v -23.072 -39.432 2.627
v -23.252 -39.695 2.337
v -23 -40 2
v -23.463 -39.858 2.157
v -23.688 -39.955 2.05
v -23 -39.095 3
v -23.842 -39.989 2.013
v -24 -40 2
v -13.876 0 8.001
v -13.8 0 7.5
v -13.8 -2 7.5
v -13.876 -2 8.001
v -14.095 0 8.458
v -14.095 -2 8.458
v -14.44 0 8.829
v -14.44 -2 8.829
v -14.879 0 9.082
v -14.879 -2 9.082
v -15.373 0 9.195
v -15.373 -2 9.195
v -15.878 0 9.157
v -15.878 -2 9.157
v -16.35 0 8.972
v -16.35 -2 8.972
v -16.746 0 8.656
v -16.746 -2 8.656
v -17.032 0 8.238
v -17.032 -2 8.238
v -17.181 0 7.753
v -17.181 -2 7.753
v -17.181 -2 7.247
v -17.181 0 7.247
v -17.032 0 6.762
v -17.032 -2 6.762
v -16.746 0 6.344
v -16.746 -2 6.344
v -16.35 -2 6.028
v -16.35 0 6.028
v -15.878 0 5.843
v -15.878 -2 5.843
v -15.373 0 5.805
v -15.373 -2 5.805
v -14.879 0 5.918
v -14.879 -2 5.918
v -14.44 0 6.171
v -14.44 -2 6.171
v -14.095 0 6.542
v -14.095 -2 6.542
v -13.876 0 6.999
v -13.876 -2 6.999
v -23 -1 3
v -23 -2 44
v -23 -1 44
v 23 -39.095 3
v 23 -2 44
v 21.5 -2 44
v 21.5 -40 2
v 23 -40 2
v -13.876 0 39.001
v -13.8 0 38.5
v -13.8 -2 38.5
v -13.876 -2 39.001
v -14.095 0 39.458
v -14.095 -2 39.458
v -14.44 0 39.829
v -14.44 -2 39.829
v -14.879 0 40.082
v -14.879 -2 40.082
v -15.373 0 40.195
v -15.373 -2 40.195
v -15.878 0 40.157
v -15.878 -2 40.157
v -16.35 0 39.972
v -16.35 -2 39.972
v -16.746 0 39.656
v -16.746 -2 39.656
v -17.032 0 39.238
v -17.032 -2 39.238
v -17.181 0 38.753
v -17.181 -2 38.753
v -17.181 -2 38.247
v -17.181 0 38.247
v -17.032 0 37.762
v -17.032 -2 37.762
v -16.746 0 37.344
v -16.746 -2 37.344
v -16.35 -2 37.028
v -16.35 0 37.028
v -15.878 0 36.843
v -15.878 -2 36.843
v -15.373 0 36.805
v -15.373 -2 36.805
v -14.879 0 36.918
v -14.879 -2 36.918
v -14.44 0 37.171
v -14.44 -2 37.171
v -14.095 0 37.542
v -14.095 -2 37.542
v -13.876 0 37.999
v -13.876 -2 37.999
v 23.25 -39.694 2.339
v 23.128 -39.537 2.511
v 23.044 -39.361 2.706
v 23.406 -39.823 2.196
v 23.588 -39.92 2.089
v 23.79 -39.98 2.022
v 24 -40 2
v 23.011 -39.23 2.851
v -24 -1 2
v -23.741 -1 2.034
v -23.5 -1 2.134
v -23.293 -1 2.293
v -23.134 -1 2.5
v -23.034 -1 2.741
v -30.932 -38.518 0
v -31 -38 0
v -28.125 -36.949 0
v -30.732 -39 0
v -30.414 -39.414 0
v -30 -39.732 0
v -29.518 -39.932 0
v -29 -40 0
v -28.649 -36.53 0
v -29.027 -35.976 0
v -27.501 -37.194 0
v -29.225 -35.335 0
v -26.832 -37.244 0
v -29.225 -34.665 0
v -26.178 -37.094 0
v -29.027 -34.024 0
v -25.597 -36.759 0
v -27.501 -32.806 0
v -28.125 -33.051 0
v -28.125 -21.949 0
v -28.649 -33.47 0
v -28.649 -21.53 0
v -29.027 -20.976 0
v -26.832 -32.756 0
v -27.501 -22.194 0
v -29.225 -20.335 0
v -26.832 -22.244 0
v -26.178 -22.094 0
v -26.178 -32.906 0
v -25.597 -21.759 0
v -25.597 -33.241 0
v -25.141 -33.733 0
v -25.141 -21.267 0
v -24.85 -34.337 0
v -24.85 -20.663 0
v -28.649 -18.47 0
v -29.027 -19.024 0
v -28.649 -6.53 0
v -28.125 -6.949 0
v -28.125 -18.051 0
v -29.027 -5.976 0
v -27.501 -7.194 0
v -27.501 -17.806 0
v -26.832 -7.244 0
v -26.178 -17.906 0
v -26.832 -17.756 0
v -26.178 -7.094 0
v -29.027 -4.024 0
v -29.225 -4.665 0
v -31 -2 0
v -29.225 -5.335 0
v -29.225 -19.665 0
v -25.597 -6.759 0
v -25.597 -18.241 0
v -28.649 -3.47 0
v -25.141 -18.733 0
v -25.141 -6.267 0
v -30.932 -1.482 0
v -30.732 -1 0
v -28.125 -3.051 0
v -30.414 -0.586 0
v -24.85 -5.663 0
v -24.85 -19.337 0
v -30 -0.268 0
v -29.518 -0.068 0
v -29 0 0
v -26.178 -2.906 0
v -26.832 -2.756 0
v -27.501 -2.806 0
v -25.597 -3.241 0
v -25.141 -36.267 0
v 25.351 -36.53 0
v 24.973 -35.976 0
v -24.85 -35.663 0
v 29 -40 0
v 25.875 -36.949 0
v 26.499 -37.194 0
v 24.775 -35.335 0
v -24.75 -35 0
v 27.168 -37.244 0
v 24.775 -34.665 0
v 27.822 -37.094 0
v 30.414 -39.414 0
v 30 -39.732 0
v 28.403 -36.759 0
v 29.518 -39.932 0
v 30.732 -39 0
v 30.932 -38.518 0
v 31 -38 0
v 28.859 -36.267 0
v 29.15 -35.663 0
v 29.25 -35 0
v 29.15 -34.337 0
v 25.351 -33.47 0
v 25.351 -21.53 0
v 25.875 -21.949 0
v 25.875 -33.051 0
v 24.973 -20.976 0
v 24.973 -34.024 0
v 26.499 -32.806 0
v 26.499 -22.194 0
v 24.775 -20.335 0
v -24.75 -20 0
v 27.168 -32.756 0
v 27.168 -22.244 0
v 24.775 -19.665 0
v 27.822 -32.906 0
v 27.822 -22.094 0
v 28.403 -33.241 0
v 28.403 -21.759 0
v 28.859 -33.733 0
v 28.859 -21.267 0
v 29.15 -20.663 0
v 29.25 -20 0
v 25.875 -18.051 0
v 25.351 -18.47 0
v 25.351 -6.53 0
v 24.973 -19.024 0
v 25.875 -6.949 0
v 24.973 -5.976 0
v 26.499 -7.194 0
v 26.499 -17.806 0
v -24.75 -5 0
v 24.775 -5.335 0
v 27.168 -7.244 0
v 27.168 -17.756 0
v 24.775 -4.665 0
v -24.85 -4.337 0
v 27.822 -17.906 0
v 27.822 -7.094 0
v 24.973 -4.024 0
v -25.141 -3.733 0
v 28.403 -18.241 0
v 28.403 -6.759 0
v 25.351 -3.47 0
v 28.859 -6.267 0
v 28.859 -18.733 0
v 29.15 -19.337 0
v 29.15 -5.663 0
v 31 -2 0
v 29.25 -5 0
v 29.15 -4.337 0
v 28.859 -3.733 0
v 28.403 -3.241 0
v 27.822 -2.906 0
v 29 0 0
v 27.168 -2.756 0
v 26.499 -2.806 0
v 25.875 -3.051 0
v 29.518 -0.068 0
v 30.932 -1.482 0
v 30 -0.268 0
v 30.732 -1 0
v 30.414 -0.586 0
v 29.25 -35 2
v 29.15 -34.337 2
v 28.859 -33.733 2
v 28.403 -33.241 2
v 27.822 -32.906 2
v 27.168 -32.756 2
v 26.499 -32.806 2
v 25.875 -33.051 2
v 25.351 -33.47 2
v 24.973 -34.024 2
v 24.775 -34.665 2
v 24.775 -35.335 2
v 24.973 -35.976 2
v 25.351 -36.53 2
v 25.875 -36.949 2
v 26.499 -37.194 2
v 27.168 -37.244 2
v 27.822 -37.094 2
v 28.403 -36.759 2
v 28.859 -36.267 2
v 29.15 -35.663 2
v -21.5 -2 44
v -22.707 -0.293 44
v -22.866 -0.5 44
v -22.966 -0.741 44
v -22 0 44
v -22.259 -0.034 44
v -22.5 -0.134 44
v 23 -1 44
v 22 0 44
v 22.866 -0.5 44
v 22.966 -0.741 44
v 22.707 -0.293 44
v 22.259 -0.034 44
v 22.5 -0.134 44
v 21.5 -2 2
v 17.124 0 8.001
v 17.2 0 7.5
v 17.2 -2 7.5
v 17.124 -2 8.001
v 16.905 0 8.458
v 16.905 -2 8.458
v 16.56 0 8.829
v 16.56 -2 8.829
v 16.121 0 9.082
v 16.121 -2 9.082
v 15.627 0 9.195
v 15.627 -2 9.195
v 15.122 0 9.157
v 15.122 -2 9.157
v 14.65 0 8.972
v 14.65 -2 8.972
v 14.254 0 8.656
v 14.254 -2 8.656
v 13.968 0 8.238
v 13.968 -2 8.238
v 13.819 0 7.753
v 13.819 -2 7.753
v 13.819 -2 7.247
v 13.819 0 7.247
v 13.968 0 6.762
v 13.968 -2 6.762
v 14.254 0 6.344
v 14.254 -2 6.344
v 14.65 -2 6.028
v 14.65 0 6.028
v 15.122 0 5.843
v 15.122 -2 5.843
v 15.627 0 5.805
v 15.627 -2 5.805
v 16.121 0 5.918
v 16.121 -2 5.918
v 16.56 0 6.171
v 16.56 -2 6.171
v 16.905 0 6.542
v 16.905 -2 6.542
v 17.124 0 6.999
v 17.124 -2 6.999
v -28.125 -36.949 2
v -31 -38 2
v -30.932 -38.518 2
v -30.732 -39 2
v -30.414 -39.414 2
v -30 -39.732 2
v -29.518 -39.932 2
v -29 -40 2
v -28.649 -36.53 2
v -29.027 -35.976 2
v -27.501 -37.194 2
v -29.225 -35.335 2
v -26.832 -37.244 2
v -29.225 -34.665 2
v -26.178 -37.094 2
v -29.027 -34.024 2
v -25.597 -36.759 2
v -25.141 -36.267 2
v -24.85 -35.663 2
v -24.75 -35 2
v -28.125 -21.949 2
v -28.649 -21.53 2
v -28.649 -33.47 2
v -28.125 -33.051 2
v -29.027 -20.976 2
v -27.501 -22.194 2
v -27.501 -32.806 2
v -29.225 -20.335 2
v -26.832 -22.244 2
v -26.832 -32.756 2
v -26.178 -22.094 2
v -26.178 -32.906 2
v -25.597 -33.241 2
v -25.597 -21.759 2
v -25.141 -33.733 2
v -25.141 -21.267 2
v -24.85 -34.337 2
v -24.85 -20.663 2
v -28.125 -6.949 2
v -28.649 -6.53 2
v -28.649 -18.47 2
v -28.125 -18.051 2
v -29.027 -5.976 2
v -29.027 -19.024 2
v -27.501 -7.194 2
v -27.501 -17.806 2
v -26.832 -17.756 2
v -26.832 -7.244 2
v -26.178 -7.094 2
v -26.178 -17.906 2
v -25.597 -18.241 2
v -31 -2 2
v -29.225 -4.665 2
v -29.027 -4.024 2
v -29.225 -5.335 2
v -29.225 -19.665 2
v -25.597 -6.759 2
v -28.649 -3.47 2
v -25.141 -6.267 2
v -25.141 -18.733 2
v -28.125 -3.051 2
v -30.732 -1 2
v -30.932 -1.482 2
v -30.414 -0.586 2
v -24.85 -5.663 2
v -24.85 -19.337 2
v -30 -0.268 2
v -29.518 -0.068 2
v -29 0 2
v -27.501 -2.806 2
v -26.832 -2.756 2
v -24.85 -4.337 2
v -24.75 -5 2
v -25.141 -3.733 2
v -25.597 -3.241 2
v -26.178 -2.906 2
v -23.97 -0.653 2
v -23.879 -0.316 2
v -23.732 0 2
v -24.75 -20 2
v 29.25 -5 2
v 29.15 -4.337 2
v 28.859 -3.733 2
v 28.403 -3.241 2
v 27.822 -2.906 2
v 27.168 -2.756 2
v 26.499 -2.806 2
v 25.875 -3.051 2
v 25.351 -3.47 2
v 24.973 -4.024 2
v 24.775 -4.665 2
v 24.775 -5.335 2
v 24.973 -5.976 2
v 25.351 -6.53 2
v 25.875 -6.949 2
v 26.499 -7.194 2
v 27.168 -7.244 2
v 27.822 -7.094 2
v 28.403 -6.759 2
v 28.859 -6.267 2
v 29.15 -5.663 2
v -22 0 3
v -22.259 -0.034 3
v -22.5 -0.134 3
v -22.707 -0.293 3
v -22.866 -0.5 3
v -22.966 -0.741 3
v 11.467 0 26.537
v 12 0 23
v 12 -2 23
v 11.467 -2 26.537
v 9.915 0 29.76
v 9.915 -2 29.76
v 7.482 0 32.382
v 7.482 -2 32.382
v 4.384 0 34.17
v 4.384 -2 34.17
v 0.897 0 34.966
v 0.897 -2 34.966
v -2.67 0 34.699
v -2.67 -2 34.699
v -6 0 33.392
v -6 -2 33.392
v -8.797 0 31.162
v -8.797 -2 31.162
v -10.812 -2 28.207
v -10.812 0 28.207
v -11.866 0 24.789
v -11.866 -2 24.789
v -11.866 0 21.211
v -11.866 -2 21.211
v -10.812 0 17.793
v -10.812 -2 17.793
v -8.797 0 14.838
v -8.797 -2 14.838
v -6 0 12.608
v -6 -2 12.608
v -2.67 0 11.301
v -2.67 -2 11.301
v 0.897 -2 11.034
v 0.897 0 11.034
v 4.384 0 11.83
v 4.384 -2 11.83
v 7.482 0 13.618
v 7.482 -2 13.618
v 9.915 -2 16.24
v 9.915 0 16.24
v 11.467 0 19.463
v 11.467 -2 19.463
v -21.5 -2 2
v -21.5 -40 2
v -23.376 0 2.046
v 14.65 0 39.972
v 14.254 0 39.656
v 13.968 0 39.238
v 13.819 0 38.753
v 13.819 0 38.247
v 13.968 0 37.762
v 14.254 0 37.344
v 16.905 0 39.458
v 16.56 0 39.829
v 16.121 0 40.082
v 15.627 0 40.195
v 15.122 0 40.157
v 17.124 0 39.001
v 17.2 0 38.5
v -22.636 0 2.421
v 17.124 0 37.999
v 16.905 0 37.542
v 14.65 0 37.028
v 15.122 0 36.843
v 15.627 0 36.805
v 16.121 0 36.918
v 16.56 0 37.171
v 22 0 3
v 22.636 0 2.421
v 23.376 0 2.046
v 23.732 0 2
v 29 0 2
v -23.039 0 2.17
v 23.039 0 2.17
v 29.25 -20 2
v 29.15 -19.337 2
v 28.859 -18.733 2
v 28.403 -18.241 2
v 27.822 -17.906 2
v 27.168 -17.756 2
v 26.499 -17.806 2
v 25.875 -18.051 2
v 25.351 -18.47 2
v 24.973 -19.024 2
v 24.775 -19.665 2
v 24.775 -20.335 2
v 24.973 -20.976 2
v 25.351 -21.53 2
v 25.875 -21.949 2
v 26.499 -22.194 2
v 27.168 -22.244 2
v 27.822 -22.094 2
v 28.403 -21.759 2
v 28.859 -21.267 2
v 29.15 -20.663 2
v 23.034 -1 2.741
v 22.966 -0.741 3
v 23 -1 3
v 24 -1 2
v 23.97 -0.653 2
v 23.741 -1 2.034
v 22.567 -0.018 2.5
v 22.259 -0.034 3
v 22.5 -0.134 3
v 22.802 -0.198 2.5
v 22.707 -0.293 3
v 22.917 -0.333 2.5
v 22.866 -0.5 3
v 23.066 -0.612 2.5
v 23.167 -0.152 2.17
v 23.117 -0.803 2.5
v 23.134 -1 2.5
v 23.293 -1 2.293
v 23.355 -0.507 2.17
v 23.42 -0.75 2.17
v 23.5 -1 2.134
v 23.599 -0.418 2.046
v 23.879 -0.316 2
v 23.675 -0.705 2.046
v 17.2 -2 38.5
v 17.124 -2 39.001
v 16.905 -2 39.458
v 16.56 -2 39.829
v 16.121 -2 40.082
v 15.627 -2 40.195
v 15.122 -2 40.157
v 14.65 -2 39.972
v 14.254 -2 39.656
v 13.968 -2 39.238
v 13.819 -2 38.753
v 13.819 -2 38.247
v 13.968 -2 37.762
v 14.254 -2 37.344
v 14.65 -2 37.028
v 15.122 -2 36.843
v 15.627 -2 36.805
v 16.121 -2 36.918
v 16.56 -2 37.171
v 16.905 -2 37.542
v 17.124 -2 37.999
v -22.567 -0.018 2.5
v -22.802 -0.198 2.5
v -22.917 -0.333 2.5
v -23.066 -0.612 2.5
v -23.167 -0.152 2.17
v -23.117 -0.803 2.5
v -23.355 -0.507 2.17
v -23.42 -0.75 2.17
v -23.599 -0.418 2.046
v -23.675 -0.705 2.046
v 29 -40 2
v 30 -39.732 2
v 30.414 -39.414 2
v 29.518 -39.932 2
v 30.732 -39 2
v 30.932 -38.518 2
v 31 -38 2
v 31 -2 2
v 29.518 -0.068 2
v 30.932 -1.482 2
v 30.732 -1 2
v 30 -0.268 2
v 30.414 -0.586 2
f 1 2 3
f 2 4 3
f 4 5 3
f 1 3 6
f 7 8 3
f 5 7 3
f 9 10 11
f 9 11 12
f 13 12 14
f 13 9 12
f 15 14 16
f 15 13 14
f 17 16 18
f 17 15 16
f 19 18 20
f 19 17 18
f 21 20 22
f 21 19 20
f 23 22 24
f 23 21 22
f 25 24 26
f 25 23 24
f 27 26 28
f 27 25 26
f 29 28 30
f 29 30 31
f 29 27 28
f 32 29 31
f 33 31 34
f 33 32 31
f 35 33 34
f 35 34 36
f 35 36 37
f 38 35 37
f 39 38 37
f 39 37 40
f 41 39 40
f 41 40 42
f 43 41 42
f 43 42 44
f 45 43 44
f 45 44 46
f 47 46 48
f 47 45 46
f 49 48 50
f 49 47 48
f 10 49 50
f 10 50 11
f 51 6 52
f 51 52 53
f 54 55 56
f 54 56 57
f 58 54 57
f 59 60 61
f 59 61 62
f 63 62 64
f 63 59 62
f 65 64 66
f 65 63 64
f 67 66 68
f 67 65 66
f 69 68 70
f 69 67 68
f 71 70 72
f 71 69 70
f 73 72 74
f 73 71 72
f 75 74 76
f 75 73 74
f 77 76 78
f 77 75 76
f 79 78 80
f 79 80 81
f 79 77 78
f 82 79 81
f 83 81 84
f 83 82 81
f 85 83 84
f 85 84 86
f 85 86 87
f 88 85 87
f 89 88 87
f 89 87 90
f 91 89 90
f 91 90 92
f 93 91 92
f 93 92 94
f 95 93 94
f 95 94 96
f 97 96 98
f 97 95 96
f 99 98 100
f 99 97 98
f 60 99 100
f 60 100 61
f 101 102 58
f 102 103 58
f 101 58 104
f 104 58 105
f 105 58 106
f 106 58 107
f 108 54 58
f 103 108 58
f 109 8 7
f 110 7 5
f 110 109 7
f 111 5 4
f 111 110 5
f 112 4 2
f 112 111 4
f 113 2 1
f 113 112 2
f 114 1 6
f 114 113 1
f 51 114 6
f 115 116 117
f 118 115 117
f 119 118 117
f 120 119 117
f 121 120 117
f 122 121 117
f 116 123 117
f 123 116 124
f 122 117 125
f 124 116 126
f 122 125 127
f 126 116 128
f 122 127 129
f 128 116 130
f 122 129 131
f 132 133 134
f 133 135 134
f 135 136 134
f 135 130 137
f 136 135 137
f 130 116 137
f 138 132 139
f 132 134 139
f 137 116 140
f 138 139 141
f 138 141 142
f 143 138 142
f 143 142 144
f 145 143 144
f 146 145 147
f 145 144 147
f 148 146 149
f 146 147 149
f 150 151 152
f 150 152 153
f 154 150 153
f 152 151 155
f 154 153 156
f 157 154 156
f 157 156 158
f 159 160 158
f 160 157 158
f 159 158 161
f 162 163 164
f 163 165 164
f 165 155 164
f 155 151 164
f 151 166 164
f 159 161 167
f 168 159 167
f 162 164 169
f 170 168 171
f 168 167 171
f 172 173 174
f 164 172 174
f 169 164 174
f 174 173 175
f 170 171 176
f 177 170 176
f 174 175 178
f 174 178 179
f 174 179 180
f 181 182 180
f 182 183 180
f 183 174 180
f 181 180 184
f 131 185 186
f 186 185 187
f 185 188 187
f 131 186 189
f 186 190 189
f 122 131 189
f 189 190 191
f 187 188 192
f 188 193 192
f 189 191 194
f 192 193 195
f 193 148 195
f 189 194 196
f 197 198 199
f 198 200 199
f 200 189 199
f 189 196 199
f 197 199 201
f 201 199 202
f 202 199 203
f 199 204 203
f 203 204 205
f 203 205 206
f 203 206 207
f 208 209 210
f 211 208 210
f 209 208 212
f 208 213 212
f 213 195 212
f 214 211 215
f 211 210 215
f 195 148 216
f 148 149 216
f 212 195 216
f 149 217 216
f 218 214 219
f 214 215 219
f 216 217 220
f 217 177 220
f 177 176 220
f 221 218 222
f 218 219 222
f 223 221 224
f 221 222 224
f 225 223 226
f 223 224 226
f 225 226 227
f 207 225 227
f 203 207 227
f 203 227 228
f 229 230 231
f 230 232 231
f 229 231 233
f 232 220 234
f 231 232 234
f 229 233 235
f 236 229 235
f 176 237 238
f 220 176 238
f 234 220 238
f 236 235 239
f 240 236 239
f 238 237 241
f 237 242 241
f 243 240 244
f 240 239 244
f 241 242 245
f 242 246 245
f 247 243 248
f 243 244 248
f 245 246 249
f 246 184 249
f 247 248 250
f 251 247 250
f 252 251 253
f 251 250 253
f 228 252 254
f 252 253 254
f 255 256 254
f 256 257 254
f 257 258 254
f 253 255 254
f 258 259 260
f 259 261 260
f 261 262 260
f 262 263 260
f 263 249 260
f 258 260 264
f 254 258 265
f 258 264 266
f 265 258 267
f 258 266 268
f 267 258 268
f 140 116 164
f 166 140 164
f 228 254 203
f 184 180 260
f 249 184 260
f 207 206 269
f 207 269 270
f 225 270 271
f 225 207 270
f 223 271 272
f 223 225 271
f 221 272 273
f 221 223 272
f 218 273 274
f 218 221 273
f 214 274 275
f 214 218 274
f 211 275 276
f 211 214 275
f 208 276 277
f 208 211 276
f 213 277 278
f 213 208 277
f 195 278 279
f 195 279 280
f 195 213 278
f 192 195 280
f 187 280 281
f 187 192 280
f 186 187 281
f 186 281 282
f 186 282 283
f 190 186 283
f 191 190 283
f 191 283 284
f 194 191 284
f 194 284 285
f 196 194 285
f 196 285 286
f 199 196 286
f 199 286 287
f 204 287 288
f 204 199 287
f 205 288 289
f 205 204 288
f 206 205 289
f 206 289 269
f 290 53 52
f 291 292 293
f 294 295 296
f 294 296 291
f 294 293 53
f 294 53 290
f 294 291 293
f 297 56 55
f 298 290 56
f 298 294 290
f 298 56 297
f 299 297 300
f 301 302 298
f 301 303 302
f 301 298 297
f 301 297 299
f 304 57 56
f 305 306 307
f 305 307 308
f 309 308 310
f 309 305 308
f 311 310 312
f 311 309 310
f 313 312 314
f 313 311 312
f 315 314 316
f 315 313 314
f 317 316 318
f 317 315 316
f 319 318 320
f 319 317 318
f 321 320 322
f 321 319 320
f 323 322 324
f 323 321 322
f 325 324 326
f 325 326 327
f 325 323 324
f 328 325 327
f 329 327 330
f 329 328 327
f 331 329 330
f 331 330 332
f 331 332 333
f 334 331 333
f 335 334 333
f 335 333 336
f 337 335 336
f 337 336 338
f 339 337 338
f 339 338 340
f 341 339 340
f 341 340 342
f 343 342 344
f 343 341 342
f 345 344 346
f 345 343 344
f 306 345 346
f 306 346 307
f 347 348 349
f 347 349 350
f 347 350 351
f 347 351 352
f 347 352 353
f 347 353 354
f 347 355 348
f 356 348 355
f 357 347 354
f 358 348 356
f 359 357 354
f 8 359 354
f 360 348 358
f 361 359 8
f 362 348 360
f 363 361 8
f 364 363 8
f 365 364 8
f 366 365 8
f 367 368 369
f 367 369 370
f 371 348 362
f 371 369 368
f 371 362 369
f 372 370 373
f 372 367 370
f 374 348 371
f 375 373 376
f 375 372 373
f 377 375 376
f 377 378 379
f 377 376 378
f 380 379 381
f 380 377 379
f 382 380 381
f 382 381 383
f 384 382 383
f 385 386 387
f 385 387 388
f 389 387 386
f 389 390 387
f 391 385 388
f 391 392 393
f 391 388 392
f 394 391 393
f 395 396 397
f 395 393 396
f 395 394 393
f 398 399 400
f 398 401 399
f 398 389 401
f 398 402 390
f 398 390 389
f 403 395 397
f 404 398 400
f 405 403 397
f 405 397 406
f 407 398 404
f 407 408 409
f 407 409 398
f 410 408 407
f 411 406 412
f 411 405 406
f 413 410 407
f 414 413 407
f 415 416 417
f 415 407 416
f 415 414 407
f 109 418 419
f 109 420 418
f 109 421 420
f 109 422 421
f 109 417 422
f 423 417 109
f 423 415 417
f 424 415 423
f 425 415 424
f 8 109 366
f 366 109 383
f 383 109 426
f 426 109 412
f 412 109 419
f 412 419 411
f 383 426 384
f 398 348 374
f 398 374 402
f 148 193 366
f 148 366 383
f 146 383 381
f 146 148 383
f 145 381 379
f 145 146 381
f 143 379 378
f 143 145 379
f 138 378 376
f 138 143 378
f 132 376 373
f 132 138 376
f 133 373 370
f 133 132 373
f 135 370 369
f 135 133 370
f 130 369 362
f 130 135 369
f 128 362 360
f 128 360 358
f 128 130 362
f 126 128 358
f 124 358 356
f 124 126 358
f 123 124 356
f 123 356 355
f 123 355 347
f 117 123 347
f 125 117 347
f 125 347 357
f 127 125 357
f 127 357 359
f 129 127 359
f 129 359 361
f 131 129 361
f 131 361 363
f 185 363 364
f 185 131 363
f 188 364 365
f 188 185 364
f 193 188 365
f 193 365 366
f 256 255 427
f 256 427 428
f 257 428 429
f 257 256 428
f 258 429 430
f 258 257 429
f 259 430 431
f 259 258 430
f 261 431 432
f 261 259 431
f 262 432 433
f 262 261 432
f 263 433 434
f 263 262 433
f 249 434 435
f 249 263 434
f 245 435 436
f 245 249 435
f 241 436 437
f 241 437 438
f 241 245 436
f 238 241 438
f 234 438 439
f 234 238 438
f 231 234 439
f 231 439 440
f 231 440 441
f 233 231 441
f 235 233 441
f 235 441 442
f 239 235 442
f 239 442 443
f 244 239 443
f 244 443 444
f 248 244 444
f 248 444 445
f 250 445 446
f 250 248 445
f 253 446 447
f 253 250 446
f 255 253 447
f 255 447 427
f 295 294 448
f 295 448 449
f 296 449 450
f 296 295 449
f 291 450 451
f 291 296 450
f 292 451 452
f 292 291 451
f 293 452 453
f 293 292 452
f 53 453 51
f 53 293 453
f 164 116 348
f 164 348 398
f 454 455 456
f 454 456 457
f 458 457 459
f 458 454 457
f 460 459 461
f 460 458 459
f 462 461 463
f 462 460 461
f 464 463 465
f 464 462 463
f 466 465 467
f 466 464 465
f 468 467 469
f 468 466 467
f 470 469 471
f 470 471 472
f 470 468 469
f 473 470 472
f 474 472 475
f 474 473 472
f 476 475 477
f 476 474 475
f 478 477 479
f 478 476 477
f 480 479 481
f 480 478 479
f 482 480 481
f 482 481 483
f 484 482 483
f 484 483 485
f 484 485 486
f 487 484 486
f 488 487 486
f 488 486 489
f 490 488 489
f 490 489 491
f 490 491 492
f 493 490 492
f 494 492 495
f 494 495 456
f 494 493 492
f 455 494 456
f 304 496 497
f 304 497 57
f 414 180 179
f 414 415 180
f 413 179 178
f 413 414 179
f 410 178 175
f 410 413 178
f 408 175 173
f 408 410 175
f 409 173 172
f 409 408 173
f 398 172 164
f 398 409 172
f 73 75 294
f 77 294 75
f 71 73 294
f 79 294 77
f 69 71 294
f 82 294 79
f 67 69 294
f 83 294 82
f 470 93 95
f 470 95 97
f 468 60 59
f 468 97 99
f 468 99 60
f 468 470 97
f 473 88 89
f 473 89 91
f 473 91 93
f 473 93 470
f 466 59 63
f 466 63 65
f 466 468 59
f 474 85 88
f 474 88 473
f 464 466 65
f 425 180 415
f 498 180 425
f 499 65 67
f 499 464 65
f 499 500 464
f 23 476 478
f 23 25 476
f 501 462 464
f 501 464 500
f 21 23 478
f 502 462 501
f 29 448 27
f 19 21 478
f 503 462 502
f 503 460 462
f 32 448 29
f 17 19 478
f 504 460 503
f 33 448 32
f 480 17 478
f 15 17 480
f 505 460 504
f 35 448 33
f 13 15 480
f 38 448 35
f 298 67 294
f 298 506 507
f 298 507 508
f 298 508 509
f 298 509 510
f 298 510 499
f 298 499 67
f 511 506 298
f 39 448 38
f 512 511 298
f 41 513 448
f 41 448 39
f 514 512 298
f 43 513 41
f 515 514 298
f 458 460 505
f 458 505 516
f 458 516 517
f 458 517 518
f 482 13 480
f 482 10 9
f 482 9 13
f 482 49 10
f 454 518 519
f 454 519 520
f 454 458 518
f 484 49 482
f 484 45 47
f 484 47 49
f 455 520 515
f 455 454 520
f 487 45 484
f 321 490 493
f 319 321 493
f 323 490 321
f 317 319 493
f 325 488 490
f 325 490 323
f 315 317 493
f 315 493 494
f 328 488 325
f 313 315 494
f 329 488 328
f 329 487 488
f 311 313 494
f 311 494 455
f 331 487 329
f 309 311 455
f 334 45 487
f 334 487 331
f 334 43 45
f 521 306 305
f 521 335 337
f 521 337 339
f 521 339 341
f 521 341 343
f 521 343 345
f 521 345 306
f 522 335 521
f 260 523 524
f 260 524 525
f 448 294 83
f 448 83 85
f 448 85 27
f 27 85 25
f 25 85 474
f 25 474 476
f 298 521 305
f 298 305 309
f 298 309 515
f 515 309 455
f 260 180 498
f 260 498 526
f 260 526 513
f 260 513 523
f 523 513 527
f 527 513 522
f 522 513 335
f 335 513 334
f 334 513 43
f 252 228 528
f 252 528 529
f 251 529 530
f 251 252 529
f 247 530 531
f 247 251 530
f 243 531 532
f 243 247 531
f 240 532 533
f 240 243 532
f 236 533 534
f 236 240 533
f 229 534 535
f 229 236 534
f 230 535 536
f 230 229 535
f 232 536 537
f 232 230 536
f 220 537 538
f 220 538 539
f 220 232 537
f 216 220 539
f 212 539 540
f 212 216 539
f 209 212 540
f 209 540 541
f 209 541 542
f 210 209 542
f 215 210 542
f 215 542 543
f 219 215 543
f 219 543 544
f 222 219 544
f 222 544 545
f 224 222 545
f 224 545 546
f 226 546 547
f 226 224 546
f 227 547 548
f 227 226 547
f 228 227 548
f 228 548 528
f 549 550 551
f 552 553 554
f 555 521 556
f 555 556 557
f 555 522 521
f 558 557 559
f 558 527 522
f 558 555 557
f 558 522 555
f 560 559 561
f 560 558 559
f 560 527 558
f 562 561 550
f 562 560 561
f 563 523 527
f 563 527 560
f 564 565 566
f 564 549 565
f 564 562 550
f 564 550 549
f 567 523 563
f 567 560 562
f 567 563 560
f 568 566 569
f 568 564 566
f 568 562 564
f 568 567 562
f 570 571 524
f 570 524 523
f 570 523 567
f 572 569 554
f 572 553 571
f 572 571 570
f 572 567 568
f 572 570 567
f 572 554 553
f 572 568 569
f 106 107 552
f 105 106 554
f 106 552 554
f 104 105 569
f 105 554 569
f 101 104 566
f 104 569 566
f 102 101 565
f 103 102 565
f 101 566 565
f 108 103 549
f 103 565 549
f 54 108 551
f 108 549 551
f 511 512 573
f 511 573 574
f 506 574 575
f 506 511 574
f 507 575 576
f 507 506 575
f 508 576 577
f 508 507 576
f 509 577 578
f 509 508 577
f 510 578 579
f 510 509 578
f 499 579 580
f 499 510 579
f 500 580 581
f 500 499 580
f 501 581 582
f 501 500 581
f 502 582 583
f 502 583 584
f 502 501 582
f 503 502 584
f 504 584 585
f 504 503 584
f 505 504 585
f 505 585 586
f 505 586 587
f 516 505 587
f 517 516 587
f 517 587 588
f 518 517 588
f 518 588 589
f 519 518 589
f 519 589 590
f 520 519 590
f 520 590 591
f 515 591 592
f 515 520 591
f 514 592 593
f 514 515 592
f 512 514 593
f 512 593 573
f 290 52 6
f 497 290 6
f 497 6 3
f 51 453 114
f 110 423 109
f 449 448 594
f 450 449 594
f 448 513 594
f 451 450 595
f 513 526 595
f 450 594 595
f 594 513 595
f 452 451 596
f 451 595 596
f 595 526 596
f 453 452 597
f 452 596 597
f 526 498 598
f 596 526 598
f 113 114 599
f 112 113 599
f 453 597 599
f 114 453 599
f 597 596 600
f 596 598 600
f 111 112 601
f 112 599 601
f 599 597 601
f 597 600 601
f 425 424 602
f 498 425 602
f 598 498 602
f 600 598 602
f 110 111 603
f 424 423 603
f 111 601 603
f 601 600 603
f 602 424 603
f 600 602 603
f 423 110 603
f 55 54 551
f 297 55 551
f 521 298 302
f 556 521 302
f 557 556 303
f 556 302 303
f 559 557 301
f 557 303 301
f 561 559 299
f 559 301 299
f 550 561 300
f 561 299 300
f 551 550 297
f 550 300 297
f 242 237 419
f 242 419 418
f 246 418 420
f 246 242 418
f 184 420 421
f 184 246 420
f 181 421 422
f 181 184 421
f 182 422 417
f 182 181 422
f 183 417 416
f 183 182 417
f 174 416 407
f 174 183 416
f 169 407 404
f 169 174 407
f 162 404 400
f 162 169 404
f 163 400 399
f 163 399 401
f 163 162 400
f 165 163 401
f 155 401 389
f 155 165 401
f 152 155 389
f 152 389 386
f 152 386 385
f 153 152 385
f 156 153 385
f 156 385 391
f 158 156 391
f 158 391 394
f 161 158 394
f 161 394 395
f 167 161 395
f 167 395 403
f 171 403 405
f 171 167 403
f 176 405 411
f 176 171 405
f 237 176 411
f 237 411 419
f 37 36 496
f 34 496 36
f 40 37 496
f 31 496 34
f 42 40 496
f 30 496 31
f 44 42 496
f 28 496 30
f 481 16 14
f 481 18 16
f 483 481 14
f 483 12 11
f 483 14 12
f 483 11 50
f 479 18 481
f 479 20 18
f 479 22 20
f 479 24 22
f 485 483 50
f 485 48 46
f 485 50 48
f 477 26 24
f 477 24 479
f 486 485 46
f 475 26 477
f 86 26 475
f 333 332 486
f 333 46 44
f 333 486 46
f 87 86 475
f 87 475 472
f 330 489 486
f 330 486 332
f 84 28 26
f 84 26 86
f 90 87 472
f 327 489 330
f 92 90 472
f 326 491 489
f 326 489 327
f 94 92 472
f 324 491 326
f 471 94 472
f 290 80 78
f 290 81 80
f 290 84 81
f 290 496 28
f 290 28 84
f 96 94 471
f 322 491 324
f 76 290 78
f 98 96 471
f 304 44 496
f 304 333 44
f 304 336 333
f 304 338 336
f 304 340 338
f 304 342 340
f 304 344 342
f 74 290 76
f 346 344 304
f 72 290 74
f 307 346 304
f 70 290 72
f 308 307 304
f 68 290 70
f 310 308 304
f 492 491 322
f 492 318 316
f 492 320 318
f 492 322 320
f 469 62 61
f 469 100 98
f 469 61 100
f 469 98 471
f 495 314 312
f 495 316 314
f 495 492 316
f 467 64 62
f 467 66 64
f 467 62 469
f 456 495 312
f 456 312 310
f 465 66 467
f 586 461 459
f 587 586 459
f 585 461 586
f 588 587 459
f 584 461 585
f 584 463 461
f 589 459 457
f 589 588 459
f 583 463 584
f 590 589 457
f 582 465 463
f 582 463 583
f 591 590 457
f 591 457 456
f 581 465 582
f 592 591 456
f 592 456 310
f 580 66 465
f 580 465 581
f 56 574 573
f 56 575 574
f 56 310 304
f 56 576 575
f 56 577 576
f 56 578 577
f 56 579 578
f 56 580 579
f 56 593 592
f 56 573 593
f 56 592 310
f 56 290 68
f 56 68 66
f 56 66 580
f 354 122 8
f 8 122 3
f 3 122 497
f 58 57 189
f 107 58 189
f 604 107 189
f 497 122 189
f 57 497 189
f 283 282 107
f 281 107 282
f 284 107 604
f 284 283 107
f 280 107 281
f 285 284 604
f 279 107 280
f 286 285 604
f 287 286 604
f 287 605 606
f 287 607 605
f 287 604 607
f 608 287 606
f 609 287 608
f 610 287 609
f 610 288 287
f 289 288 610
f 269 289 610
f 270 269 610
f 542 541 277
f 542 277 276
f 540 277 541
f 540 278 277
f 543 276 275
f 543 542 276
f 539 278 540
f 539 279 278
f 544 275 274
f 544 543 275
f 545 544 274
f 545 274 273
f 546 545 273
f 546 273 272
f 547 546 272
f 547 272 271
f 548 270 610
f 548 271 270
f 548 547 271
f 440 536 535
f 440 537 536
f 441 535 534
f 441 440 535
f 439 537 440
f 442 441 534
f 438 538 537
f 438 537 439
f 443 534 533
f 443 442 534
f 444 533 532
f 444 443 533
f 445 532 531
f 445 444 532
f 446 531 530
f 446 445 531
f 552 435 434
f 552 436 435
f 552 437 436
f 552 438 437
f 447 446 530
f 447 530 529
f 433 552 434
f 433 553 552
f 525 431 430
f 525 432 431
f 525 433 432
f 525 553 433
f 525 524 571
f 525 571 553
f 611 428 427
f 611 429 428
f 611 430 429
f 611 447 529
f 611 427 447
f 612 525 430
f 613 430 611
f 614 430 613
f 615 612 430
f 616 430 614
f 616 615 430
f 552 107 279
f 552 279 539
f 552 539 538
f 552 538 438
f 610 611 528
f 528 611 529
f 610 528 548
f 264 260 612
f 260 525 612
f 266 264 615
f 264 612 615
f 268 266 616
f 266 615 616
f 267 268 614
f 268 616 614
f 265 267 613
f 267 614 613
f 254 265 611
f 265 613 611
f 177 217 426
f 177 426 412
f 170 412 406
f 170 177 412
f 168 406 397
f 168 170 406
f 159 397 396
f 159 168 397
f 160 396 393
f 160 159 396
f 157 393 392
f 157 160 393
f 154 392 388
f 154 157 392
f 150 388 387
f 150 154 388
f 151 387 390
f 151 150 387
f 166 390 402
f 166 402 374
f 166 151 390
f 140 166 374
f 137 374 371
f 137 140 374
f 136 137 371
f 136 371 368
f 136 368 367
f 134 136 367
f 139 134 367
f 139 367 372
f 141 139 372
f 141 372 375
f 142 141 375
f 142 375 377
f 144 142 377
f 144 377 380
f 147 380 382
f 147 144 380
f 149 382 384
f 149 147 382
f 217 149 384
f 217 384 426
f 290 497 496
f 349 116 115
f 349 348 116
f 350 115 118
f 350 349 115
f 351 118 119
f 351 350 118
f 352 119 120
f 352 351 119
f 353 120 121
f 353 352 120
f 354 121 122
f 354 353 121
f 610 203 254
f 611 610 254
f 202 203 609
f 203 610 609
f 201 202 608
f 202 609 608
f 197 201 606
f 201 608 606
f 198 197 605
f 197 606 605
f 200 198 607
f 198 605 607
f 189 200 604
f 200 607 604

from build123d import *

# Parameters (mm, degrees)
F0_W         = 62
F0_H         = 40
F0_R         = 2.25
F1_DEPTH     = 2
F2_W         = 46
F2_H         = 42
F2_R         = 1.7
F2_R_2       = 12
F3_DEPTH     = 2
F5_DEPTH     = 1.5
F6_R         = 2
F7_R         = 1
F8_T4_DEPTH  = 41.5
F8_T9_ANGLE  = 233.2969892374
F8_T15_ANGLE = 233.2969892374
F8_T21_DEPTH = 41.5


# Not quite as in the source:
# - a fillet or chamfer that OpenCascade refuses, or shapes differently, is made with other operations: its cross-section is extruded or revolved along the edge and cut away or added
# - a pattern or mirror of a feature is missing from the dataset's text; its kind, count and spacing are read off the source's solid


with BuildPart() as f1:
    # F0 (on Top) → F1 (new body)
    with BuildSketch(Plane.XY):
        with Locations((0, -20)):
            Rectangle(F0_W, F0_H)
        with Locations((-27, -35)):
            Circle(F0_R, mode=Mode.SUBTRACT)
        with Locations((27, -35)):
            Circle(F0_R, mode=Mode.SUBTRACT)
        with Locations((-27, -20)):
            Circle(F0_R, mode=Mode.SUBTRACT)
        with Locations((-27, -5)):
            Circle(F0_R, mode=Mode.SUBTRACT)
        with Locations((27, -20)):
            Circle(F0_R, mode=Mode.SUBTRACT)
        with Locations((27, -5)):
            Circle(F0_R, mode=Mode.SUBTRACT)
    extrude(amount=F1_DEPTH)

    # F2 (on Front) → F3 (join)
    with BuildSketch(Plane.XZ):
        with Locations((0, 23)):
            Rectangle(F2_W, F2_H)
        with Locations((-15.5, 7.5)):
            Circle(F2_R, mode=Mode.SUBTRACT)
        with Locations((15.5, 7.5)):
            Circle(F2_R, mode=Mode.SUBTRACT)
        with Locations((-15.5, 38.5)):
            Circle(F2_R, mode=Mode.SUBTRACT)
        with Locations((0, 23)):
            Circle(F2_R_2, mode=Mode.SUBTRACT)
        with Locations((15.5, 38.5)):
            Circle(F2_R, mode=Mode.SUBTRACT)
    extrude(amount=F3_DEPTH)

    # F4 (on face) → F5 (join)
    with BuildSketch(Plane.YZ.offset(23)):
        Polygon((-2, 2), (-2, 44), (-40, 2), align=None)
    f5 = extrude(amount=-F5_DEPTH)

    # F5_copies: F5 across plane
    add(f5.mirror(Plane(origin=(0, 0, 0), x_dir=(0, 0, -1), z_dir=(-1, 0, 0))))

    # F6
    f6_edges = [f1.edges().sort_by_distance(p)[0] for p in [
        (31, -40, 1),
        (31, 0, 1),
        (-31, 0, 1),
        (-31, -40, 1),
    ]]
    fillet(f6_edges, radius=F6_R)

    # F7
    f7_edges = [f1.edges().sort_by_distance(p)[0] for p in [
        (-23, 0, 23),
        (23, 0, 23),
    ]]
    fillet(f7_edges, radius=F7_R)

    # F8: fillet of radius 1 on 4 edges, made by hand


with BuildPart() as f8_tool2:
    # F8_s3 → F8_t4 (new body)
    with BuildSketch(Plane.XZ.offset(1)):
        with BuildLine():
            ThreePointArc((24, 2), (23.2928932188, 2.2928932188), (23, 3))
            Line((23, 3), (23, 2))
            Line((23, 2), (24, 2))
        make_face()
    extrude(amount=F8_T4_DEPTH)

    split(bisect_by=Plane(origin=(0, -22.9900249377, 20.8004987531), x_dir=(1, 0, 0), z_dir=(0, 0.7415357791, -0.670913324)), keep=Keep.TOP)


with BuildPart() as f1_1:
    add(f1.part)

    # F8_t1: union F8_tool2
    add(f8_tool2.part)


with BuildPart() as f8_tool7:
    # F8_s8 → F8_t9 (revolve)
    with BuildSketch(Plane(origin=(14.6206404523, -10.8990847056, 0), x_dir=(0, 0, 1), z_dir=(0.8017442393, -0.5976672776, 0))):
        with BuildLine():
            ThreePointArc((3, -11.3469358686), (2.2928932188, -11.0540426498), (2, -10.3469358686))
            Line((2, -10.3469358686), (2, -11.3469358686))
            Line((2, -11.3469358686), (3, -11.3469358686))
        make_face()
    revolve(axis=Axis((22, -1, 2), (0, 0, -1)), revolution_arc=F8_T9_ANGLE)

    split(bisect_by=Plane.XZ, keep=Keep.TOP)

    split(bisect_by=Plane.XZ.offset(2), keep=Keep.BOTTOM)


with BuildPart() as f1_2:
    add(f1_1.part)

    # F8_t6: union F8_tool7
    add(f8_tool7.part)


with BuildPart() as f8_tool13:
    # F8_s14 → F8_t15 (revolve)
    with BuildSketch(Plane(origin=(-14.6206404523, -10.8990847056, 0), x_dir=(0, 0, 1), z_dir=(-0.8017442393, -0.5976672776, 0))):
        with BuildLine():
            ThreePointArc((3, 11.3469358686), (2.2928932188, 11.0540426498), (2, 10.3469358686))
            Line((2, 10.3469358686), (2, 11.3469358686))
            Line((2, 11.3469358686), (3, 11.3469358686))
        make_face()
    revolve(axis=Axis((-22, -1, 2), (0, 0, 1)), revolution_arc=F8_T15_ANGLE)

    split(bisect_by=Plane.XZ, keep=Keep.TOP)

    split(bisect_by=Plane.XZ.offset(2), keep=Keep.BOTTOM)


with BuildPart() as f1_3:
    add(f1_2.part)

    # F8_t12: union F8_tool13
    add(f8_tool13.part)


with BuildPart() as f8_tool19:
    # F8_s20 → F8_t21 (new body)
    with BuildSketch(Plane.XZ.offset(1)):
        with BuildLine():
            ThreePointArc((-24, 2), (-23.2928932188, 2.2928932188), (-23, 3))
            Line((-23, 3), (-23, 2))
            Line((-23, 2), (-24, 2))
        make_face()
    extrude(amount=F8_T21_DEPTH)

    split(bisect_by=Plane(origin=(0, -22.9900249377, 20.8004987531), x_dir=(1, 0, 0), z_dir=(0, 0.7415357791, -0.670913324)), keep=Keep.TOP)


with BuildPart() as f1_4:
    add(f1_3.part)

    # F8_t18: union F8_tool19
    add(f8_tool19.part)


solid = f1_4.part
